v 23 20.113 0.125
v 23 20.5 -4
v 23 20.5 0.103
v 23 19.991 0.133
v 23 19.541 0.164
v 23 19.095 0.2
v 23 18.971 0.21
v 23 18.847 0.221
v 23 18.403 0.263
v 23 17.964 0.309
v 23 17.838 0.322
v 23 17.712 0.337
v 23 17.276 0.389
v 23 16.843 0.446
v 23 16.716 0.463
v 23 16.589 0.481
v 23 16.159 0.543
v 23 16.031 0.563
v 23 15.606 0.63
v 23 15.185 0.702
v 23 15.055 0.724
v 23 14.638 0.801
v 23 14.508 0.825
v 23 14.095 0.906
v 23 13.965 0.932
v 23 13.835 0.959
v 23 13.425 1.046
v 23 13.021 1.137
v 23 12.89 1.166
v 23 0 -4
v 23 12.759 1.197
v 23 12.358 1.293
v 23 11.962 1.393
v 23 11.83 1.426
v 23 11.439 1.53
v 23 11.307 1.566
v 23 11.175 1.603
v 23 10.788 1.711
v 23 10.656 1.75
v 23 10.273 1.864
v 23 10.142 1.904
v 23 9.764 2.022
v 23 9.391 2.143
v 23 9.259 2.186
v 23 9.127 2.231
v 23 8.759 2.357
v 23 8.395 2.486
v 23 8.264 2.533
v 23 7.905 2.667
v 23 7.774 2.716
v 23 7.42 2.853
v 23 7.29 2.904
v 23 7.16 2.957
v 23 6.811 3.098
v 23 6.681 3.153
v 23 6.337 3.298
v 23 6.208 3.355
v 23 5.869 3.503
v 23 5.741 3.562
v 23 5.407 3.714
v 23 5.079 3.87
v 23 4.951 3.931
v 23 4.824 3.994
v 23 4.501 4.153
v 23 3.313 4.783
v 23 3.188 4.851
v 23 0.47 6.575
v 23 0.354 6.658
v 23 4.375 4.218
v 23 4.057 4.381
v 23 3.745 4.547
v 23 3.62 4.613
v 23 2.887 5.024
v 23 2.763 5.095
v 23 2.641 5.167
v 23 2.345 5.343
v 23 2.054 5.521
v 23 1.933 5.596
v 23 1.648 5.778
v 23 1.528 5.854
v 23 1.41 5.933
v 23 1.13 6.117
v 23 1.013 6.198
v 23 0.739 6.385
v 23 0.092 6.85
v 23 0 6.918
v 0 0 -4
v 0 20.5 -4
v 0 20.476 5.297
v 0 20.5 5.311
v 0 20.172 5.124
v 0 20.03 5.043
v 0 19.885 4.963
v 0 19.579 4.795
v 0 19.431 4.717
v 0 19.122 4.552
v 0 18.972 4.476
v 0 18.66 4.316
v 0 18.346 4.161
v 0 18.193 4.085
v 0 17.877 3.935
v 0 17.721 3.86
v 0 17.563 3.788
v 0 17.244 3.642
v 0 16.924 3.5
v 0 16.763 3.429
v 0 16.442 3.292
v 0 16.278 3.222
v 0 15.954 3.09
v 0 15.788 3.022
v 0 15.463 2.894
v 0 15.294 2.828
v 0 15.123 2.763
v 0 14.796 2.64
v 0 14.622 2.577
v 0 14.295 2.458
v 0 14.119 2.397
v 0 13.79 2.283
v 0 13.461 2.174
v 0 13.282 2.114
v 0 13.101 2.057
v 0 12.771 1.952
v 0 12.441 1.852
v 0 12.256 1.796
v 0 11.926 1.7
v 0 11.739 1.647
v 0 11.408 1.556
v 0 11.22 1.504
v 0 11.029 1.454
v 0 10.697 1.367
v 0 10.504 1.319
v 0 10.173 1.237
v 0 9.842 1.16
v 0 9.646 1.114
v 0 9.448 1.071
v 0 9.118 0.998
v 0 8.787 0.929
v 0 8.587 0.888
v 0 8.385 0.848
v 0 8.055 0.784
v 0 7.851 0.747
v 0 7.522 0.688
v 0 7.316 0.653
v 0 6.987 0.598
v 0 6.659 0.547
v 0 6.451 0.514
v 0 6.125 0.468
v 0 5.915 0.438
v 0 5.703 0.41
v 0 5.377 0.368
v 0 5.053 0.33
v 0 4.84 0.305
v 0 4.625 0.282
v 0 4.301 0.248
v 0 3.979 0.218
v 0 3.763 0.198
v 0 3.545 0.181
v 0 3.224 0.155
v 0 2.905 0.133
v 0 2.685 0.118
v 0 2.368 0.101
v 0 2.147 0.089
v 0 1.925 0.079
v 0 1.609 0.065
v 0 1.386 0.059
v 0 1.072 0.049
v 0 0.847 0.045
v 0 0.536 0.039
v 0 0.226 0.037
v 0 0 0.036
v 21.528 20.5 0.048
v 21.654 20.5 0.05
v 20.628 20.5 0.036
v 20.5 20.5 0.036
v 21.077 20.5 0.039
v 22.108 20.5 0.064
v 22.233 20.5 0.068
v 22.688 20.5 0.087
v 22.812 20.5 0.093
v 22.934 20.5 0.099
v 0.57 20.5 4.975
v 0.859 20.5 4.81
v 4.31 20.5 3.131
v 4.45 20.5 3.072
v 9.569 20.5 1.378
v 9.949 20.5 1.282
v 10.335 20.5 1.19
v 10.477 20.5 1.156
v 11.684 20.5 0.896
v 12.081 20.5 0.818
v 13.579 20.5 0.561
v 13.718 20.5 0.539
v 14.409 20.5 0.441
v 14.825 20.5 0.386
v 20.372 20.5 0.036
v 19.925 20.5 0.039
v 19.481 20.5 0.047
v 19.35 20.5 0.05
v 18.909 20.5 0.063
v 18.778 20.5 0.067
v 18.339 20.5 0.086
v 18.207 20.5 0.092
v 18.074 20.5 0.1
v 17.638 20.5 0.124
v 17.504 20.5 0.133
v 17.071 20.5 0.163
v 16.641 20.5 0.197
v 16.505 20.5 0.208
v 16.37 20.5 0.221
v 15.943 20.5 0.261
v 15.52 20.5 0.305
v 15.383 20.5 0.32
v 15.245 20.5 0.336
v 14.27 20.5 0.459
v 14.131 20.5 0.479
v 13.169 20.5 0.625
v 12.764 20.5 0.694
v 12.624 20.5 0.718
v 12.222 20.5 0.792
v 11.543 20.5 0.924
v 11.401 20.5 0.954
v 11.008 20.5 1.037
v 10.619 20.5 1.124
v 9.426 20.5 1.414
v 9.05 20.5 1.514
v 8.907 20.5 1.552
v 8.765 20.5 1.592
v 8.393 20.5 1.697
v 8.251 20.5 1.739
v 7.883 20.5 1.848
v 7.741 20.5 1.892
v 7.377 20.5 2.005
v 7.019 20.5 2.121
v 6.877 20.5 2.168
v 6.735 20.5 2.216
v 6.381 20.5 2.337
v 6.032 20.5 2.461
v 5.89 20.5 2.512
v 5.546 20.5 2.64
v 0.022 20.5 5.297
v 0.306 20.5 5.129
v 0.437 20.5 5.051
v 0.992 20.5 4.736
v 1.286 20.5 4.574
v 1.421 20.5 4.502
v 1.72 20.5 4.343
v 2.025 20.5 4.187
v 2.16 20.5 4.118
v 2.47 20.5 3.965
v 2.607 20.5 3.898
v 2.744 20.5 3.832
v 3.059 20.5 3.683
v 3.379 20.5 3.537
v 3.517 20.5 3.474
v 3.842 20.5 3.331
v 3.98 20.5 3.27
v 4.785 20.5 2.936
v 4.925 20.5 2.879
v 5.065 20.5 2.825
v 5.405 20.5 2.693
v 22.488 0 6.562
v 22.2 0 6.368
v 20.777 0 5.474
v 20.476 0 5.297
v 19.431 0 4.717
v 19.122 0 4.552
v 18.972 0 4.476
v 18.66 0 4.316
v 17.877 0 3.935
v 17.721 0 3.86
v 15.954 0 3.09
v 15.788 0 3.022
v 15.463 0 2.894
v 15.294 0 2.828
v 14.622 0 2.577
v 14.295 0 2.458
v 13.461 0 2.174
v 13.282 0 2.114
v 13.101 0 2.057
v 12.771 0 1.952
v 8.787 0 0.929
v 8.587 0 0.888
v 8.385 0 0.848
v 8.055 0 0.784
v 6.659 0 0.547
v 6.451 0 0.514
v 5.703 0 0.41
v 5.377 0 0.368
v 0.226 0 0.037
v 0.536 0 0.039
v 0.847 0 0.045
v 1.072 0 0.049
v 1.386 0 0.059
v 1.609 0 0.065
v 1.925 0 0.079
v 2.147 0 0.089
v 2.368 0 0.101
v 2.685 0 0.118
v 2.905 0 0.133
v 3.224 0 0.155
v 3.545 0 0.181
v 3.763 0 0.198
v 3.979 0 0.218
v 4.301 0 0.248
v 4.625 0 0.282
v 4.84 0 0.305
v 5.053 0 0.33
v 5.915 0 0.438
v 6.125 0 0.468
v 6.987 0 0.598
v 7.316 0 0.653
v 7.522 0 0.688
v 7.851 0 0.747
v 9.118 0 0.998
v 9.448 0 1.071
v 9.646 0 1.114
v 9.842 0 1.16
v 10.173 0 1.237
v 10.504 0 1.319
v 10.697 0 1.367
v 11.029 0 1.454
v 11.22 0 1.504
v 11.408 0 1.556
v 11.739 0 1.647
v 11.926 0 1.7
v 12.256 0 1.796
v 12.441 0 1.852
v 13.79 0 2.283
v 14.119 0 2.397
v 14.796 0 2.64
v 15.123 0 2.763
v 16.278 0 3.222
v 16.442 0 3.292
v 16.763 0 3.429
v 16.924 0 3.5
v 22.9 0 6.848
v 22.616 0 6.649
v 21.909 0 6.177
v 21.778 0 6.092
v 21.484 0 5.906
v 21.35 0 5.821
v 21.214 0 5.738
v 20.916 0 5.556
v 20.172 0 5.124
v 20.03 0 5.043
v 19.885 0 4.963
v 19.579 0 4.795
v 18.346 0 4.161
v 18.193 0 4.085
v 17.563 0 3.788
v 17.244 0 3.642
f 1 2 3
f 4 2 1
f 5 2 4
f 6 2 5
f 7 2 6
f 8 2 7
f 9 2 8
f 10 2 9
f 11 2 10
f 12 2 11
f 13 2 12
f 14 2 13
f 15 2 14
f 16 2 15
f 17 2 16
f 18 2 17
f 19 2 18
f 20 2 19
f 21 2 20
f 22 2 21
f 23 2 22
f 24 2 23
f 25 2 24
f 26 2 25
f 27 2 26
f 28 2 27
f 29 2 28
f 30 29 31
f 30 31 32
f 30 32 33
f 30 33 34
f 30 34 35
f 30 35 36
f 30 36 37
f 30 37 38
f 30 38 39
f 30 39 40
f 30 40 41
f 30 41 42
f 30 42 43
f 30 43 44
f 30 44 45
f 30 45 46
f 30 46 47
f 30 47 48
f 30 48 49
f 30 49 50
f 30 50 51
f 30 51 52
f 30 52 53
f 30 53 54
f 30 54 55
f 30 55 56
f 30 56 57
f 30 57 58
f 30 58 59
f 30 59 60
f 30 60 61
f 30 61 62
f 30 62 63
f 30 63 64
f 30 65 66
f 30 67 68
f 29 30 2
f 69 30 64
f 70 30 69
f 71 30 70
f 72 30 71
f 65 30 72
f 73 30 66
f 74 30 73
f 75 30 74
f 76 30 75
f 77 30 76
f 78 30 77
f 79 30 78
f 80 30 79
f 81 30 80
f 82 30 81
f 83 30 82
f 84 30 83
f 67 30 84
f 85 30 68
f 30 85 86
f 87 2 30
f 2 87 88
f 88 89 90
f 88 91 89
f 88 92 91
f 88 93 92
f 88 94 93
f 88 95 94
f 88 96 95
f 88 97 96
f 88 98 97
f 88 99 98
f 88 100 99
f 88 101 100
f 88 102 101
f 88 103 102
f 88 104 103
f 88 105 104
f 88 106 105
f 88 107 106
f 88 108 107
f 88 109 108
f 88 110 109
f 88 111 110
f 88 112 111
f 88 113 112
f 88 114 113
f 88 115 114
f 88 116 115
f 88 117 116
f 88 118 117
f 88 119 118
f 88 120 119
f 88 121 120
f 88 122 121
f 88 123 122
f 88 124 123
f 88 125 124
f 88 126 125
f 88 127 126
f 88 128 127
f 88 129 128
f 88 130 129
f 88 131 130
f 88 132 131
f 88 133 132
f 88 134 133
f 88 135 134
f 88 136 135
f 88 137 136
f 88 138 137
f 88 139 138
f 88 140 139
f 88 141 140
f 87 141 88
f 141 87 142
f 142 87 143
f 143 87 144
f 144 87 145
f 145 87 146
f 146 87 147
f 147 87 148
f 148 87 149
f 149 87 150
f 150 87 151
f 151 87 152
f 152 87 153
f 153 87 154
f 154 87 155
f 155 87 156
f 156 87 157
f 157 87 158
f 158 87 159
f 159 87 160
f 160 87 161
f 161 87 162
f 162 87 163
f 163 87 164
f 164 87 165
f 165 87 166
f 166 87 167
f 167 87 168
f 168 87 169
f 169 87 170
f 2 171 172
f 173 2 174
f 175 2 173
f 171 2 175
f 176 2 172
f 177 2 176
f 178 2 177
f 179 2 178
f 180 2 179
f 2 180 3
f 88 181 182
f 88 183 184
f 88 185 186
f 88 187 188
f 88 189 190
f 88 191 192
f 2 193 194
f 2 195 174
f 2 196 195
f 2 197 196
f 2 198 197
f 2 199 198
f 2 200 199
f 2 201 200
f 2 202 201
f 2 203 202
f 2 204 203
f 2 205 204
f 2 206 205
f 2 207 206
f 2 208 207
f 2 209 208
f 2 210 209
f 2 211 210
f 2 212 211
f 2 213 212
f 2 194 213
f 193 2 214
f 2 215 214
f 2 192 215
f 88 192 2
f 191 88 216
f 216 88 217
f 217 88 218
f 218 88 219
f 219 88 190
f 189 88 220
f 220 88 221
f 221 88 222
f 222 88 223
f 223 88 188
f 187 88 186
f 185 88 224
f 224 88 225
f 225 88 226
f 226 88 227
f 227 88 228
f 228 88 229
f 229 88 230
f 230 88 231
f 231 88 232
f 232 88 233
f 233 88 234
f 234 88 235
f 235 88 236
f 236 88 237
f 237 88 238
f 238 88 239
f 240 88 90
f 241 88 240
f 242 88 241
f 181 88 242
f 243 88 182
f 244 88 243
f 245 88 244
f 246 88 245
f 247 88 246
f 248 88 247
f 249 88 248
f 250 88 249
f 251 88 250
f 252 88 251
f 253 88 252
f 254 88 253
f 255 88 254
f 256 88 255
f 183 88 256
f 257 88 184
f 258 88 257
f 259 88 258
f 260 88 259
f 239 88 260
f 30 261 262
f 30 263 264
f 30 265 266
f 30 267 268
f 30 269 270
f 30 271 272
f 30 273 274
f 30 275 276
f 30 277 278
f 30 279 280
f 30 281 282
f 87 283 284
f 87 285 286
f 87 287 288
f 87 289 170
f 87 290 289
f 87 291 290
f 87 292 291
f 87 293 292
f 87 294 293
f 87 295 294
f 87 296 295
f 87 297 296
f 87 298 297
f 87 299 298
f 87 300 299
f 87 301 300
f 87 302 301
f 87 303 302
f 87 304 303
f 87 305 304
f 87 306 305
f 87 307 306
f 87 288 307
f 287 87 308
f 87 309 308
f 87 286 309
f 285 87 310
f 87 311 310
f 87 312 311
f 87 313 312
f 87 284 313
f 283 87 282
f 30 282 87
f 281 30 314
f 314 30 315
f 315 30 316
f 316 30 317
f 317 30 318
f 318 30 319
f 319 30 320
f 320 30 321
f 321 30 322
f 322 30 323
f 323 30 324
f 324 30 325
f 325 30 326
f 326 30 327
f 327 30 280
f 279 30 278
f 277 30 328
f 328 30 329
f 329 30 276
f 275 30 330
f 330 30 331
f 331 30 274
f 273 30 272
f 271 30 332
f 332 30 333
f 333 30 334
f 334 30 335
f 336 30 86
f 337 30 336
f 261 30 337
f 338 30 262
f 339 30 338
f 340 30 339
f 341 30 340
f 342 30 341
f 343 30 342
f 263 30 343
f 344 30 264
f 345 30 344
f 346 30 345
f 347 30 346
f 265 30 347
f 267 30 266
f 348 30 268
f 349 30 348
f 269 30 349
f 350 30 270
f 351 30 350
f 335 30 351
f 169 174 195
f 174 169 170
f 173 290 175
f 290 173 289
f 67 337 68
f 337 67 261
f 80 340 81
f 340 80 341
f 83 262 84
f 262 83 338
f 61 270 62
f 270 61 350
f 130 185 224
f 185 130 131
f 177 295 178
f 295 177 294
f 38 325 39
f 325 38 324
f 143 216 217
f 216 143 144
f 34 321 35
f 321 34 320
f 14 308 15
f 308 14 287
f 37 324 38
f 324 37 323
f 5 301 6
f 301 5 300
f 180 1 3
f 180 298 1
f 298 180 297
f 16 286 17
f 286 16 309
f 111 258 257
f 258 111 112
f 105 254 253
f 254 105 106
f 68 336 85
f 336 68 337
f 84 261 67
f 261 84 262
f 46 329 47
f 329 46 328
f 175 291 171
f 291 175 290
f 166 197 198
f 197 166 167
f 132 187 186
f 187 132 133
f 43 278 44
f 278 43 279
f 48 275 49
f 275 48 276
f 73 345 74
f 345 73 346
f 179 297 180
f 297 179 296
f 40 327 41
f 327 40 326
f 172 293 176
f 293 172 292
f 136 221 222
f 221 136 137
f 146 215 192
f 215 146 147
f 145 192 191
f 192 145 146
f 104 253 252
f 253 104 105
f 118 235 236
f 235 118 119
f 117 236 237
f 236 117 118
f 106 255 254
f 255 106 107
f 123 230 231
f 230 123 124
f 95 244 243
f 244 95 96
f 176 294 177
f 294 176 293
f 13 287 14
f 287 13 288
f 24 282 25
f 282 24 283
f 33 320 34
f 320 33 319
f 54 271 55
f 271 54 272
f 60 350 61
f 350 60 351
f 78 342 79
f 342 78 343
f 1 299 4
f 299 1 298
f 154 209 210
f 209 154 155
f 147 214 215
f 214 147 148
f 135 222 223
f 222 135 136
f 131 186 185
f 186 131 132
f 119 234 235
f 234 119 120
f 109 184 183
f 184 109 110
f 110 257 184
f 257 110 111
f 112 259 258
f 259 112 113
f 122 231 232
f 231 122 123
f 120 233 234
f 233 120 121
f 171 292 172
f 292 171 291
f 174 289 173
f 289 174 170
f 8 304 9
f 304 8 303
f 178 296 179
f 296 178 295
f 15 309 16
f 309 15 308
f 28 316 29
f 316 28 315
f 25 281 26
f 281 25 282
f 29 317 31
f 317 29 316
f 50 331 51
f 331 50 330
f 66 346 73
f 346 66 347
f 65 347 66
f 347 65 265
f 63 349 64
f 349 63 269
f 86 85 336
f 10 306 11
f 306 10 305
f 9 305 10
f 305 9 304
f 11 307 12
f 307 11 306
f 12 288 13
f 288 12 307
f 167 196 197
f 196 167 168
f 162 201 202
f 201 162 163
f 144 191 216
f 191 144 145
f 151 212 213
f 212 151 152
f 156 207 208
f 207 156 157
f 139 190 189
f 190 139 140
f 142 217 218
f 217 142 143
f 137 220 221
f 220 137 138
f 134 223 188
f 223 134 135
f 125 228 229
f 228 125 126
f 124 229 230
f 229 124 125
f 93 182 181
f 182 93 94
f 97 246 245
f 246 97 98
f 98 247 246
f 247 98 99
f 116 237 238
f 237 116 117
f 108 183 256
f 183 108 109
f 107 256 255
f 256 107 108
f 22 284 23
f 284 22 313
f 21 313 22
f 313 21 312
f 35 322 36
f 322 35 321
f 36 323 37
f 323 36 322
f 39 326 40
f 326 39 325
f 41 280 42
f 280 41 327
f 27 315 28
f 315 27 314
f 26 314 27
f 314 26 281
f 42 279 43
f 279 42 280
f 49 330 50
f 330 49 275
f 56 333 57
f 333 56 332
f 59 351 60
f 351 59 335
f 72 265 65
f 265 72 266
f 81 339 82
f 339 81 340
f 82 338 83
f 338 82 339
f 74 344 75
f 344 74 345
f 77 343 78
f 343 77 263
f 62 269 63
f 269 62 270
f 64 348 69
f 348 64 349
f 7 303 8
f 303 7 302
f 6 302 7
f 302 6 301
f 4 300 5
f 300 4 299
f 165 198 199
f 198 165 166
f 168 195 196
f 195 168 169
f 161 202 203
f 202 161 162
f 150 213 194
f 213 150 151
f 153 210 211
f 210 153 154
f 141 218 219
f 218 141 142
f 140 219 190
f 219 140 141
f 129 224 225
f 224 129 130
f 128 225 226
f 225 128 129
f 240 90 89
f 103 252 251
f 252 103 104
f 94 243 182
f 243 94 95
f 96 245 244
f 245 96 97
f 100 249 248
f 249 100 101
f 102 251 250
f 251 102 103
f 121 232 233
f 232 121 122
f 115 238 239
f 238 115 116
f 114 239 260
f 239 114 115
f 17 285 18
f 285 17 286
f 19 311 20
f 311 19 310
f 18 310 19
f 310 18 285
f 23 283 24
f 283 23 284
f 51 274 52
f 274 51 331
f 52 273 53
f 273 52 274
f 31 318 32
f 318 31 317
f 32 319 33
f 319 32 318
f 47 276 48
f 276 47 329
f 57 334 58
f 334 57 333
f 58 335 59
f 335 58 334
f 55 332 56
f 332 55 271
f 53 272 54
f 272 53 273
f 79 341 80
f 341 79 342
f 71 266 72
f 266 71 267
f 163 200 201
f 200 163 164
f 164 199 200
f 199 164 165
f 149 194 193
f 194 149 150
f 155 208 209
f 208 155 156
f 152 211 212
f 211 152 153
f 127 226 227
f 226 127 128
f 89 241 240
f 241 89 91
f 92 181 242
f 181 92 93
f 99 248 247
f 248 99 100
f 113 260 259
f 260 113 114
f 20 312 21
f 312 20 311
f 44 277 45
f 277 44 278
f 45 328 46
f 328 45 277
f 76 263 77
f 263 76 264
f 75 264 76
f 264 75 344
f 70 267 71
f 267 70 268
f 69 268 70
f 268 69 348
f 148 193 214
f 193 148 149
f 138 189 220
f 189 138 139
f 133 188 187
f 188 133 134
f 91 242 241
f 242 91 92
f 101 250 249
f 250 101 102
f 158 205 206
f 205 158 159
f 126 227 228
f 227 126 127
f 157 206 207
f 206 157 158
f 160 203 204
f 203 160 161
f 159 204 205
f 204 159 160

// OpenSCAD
$fn=360;

$hypotenus=29.28;
$inside_corner=$hypotenus/sqrt(2);
$inside_radius=$inside_corner/2;
$inside_width=102;
$inside_length=131;
$corner_width=4;
$outside_radius=$inside_radius+$corner_width;
$outside_corner=$inside_corner+$corner_width;
$outside_length=133;
$outside_width=152;

$side_diameter=41;
$front_diameter=46;
$cylinder_length=43.61;
$base_height=4;

module corner(){
    linear_extrude(height=24){
        polygon([[$inside_radius,0],[$inside_corner,0],[0,$inside_corner],[0,$inside_radius]]);
        intersection(){
            translate([$inside_radius,$inside_radius]){
                circle(r=$inside_radius);
            }
            square($inside_radius);
        }
    }
}

translate([$outside_corner-$inside_corner,$outside_corner-$inside_corner,0]){
    corner();
}

translate([$outside_corner+$inside_width+$outside_corner,$outside_corner-$inside_corner,0]){
   rotate([0,0,90]){
       corner();
   }
}

translate([$outside_radius,$outside_radius,-$base_height]){
    linear_extrude(height=$base_height){
        minkowski(){
            square([$inside_width+$outside_corner,$outside_length+$outside_radius-$side_diameter/2]);
            circle($outside_radius);
        }
    }
}

translate([0,$outside_length+$front_diameter/2,0]){
    rotate([0,0,-90]){
        difference(){
            translate([0,0,-$base_height]){
                cube([$front_diameter/2,$side_diameter/2,$side_diameter/2+$base_height]);
            }
            translate([$side_diameter/2,$side_diameter/2,$side_diameter/2]){
                rotate([90,0,45]){
                    translate([0,0,-$cylinder_length/2]){
                        cylinder(d=$side_diameter,h=$cylinder_length);
                    }
                }
            }
        }
    }
}

translate([$outside_width+3.5,$outside_length+$front_diameter/2,0]){
    rotate([0,0,-180]){
!        difference(){
            translate([0,0,-$base_height]){
                cube([$front_diameter/2,$side_diameter/2,$side_diameter/2+$base_height]);
            }
            translate([0,0,($side_diameter+$front_diameter)/4]){
//            translate([0,0,($side_diameter+$front_diameter)/4]){
                rotate([0,atan2($cylinder_length,($front_diameter-$side_diameter)/2),45]){
                    translate([0,0,-$cylinder_length*3/2]){
                        cylinder(r1=($side_diameter-($front_diameter-$side_diameter))/2,r2=($front_diameter+($front_diameter-$side_diameter))/2,h=$cylinder_length*3);
                    }
                }
            }
        }
    }
}
//square([$outside_width,$outside_length]);
